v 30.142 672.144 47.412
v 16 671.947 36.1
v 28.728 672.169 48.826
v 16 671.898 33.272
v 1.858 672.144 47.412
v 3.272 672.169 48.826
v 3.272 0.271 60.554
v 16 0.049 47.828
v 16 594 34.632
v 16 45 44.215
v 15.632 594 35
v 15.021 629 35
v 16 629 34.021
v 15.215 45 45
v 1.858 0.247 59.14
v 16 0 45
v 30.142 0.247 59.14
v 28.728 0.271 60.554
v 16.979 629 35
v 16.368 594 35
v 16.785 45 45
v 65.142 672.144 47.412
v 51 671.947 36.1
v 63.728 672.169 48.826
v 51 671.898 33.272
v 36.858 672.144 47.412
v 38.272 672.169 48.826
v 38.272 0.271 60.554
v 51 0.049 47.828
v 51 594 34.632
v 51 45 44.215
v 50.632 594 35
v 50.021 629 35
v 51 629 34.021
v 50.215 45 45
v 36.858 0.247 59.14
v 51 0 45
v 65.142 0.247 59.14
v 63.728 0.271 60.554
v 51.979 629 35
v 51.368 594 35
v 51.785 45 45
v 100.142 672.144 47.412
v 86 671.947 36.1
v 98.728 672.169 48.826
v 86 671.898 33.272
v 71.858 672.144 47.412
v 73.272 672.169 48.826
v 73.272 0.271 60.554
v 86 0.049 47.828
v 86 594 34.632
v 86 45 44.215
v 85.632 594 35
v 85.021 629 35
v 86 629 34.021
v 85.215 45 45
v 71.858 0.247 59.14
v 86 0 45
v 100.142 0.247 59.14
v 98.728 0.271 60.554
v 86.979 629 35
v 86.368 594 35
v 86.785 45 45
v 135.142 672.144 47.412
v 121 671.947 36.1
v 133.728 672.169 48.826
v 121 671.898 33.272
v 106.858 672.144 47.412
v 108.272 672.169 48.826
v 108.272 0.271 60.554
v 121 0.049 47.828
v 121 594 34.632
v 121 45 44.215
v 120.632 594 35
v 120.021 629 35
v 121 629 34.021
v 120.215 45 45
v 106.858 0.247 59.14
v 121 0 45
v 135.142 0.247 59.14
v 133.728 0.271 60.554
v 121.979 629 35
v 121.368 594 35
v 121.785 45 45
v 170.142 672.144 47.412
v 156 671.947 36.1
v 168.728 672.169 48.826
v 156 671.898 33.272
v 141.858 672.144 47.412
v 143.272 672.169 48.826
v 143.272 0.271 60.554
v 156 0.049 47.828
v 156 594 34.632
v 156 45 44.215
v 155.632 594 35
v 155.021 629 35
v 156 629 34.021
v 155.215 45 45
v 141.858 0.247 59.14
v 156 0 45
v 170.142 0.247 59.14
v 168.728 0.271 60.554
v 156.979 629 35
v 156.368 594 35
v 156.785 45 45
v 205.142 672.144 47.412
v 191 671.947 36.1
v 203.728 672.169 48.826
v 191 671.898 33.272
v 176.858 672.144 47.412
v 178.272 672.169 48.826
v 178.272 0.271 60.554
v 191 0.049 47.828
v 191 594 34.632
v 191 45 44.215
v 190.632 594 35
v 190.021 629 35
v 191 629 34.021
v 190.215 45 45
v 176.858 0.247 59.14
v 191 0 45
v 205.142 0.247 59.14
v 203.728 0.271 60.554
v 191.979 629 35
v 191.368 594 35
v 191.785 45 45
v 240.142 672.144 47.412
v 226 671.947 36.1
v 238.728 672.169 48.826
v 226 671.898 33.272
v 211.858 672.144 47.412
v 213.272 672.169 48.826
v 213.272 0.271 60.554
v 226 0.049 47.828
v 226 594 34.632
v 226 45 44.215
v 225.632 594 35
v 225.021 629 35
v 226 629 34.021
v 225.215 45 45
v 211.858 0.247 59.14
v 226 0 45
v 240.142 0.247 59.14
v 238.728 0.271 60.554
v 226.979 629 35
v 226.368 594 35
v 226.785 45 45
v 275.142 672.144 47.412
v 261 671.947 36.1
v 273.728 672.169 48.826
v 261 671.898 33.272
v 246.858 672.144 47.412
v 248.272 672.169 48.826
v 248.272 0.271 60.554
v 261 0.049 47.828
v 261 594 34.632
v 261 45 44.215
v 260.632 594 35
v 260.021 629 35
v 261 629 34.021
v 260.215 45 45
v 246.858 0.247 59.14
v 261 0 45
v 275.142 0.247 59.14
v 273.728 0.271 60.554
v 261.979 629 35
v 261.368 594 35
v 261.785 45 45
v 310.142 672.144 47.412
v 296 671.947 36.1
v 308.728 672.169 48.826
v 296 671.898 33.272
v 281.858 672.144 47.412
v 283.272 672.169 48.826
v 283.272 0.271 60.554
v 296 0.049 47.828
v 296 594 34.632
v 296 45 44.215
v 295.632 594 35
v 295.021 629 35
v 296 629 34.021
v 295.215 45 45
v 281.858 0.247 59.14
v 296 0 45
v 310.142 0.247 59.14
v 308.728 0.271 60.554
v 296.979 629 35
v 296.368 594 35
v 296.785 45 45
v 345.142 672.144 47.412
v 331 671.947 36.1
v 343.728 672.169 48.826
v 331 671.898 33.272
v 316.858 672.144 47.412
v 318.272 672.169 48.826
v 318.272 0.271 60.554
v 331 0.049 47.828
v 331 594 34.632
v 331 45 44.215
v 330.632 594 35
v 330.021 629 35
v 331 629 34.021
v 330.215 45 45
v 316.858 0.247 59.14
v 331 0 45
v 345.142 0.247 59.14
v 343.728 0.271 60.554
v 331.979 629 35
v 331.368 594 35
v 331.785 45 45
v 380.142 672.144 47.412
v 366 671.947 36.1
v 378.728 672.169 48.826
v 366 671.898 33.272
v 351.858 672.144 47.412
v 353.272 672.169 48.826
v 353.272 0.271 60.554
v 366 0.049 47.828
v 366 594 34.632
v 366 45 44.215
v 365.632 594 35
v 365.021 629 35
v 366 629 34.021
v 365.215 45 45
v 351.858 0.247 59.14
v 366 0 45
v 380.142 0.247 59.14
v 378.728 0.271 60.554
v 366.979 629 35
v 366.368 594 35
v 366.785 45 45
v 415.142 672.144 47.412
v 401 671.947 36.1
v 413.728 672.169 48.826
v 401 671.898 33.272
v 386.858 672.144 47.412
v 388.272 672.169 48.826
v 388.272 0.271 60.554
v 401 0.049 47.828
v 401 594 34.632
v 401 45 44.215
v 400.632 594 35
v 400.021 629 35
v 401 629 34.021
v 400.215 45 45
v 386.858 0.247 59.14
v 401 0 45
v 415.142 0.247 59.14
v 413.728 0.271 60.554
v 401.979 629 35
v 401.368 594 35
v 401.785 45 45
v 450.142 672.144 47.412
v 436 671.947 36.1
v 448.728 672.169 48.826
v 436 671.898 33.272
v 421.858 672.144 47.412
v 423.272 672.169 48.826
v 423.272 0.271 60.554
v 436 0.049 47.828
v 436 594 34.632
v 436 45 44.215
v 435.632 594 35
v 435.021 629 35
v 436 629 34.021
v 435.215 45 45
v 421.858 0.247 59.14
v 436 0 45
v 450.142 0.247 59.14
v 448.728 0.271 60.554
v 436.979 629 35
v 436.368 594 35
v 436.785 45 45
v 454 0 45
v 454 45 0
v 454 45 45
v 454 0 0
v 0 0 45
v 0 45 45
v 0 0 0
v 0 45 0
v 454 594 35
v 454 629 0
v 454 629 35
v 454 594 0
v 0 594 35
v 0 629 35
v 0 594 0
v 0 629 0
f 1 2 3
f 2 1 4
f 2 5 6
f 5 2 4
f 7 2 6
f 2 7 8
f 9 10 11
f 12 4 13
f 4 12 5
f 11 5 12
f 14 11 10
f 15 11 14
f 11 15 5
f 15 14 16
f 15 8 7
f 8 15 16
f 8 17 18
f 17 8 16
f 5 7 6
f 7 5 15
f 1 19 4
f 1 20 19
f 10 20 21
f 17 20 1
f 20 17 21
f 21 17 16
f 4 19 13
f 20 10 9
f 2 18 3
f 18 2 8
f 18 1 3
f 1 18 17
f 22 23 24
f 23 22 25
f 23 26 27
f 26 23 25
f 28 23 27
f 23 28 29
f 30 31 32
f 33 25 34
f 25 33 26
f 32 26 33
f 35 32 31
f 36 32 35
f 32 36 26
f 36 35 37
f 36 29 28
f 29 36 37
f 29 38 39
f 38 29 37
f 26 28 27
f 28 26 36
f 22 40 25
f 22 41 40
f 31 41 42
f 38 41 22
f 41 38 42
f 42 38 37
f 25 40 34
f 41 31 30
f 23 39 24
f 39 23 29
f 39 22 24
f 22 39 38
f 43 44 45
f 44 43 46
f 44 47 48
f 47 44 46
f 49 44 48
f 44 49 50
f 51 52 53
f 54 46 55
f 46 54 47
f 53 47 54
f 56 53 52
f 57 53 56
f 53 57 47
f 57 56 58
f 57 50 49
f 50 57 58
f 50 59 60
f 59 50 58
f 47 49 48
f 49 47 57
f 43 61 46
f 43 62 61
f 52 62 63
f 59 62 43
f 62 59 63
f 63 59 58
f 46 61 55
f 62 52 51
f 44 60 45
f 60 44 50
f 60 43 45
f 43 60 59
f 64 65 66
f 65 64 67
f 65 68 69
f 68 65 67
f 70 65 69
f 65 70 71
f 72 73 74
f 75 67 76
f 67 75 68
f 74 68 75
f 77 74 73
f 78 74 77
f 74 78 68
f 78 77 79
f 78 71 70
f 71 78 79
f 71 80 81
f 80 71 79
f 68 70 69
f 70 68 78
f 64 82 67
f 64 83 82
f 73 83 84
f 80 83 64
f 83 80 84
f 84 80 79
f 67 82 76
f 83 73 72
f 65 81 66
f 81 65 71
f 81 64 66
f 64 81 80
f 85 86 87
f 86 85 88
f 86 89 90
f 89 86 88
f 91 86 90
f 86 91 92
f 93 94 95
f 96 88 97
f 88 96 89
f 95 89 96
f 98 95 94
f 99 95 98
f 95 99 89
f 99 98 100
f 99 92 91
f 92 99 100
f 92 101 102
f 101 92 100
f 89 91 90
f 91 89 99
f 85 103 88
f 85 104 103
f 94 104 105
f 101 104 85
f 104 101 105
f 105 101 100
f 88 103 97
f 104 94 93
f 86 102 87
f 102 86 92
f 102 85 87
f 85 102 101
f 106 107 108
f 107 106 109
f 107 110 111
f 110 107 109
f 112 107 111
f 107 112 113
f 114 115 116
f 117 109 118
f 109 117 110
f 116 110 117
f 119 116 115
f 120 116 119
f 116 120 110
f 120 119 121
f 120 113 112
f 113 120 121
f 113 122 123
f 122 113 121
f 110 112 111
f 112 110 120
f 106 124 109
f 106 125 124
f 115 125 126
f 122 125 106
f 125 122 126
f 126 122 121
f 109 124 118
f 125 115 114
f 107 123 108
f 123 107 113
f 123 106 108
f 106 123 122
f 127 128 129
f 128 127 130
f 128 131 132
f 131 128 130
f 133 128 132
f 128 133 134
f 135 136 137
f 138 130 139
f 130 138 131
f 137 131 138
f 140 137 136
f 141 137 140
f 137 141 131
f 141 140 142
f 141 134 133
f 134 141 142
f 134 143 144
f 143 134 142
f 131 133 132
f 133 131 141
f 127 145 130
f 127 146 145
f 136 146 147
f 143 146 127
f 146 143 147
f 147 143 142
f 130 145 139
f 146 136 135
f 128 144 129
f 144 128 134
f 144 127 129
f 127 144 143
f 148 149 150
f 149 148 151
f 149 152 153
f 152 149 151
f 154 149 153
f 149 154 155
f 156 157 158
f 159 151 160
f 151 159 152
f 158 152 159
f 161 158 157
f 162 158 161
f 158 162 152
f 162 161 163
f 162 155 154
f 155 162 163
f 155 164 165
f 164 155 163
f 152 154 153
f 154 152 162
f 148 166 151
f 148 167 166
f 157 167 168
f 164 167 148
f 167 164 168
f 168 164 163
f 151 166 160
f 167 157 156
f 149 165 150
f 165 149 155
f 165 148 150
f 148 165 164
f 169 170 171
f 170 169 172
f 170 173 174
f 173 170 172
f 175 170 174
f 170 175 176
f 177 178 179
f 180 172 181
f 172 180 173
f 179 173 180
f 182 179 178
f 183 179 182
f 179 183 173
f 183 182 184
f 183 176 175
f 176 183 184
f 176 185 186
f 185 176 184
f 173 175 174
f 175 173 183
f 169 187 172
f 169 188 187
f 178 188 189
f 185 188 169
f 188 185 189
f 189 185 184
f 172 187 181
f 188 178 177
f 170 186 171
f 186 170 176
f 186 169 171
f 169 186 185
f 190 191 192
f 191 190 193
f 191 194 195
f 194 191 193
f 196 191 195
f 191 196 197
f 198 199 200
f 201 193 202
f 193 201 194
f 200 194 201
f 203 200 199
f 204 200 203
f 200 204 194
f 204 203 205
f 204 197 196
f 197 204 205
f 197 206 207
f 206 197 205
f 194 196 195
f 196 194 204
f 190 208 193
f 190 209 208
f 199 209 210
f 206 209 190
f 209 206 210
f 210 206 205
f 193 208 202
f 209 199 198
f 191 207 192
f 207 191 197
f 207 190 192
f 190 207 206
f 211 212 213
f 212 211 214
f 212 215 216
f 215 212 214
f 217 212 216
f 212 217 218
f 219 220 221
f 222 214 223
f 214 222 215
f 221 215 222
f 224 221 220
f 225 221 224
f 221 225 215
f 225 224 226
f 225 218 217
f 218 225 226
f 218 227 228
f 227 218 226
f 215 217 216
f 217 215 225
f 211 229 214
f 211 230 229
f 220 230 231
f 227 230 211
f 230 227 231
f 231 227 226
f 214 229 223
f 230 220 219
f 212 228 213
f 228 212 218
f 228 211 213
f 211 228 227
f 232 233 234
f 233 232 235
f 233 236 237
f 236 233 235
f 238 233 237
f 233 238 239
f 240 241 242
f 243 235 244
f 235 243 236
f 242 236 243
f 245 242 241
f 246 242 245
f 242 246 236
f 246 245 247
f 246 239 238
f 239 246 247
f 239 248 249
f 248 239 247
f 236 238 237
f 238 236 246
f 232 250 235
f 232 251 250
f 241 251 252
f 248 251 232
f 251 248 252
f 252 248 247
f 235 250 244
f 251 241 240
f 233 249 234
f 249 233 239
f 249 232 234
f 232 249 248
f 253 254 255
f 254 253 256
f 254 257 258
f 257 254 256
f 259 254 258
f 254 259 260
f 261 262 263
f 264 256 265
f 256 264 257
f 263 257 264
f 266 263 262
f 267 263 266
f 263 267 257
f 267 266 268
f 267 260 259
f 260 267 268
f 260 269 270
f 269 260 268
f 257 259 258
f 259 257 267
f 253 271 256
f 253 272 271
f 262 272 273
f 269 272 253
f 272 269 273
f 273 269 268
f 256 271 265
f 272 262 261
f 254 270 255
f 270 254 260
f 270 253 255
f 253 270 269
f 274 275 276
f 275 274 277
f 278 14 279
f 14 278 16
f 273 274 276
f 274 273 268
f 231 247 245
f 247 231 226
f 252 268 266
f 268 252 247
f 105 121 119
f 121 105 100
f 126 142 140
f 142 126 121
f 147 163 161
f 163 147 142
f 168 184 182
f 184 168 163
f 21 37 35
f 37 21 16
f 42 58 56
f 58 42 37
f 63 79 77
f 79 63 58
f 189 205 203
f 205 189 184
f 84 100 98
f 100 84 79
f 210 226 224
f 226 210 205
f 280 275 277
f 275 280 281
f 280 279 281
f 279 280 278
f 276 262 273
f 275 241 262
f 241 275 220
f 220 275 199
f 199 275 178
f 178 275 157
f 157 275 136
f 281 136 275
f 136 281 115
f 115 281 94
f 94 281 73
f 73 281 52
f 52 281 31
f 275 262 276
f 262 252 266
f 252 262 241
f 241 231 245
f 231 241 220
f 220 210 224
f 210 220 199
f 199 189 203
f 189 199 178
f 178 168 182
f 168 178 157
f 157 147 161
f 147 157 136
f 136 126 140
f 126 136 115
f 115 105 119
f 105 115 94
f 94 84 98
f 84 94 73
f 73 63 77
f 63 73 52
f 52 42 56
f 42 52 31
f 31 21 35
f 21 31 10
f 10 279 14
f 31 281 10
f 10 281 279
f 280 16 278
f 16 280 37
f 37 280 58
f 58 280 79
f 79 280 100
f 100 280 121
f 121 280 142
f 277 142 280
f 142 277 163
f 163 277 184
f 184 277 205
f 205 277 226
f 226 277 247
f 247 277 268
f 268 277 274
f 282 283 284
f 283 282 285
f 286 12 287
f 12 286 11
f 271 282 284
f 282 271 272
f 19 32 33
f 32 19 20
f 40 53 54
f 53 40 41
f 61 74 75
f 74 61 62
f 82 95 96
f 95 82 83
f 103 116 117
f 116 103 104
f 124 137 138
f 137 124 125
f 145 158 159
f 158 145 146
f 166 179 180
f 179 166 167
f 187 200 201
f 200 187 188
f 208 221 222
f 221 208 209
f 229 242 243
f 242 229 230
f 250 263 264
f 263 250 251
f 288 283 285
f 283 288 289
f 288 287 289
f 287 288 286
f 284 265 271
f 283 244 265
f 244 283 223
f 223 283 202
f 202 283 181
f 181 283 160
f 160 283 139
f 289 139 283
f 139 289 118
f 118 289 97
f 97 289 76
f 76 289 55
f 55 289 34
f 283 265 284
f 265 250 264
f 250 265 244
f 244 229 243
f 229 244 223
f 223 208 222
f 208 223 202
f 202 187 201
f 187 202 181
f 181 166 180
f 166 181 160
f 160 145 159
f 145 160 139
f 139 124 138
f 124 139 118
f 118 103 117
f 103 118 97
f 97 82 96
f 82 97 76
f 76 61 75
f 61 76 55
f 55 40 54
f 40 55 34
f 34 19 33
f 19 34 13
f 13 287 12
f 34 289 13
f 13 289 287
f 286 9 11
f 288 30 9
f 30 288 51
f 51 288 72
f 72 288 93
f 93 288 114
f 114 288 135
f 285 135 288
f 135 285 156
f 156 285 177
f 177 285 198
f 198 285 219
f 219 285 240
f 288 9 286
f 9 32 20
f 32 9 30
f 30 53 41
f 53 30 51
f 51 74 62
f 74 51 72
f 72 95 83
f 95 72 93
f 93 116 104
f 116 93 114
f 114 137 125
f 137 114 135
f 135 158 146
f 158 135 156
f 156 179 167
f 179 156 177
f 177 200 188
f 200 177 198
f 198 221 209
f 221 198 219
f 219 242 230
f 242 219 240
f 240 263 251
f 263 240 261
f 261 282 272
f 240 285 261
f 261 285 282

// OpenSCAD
// file: ../../library/profiles.scad
module lShapeProfile($length, $size, $thickness) {
    cube([$length, $size, $thickness]);
    rotate([90, 0, 0])
    translate([0, 0, -$thickness]) cube([$length, $size, $thickness]);
}


module uShapeProfile($length, $size, $thickness) {
    cube([$length, $size, $thickness]);
    rotate([90, 0, 0])
    translate([0, 0, -$thickness]) cube([$length, $size, $thickness]);

    translate([0, $size, 0])
    rotate([90, 0, 0])
    cube([$length, $size, $thickness]);
}


module squareTubeProfile($length, $size, $thickness) {
    cube([$length, $size, $thickness]);

    rotate([90, 0, 0])
    translate([0, 0, -$thickness])
    cube([$length, $size, $thickness]);

    translate([0, $size, 0])
    rotate([90, 0, 0])
    cube([$length, $size, $thickness]);

    translate([0, 0, $size - $thickness])
    cube([$length, $size, $thickness]);
}
// file: grate.scad
include <../../library/profiles.scad>
include <./config.scad>


grateLength = floor(outerWidth - fireBasketWidth - (profileSize * 4) - (grateGap * 4) - ((4 * grateProfileThickness)));
grateWidth = outerDepth - profileSize - (6 * grateProfileThickness);
halfGrateLength = floor((grateLength - grateProfileThickness) / 2);


module grateTemplate(grateLength = 400, grateWidth = 400, frontProjection = false) {
    // hinten
    if (frontProjection) {
        cube([grateLength, profileSize, profileSize]);
    } else {
        cube([grateLength, profileSize + 5, profileSize + 5]);
    }
    // vorne
    translate([0, grateWidth - profileSize - 8, 0])
    cube([grateLength, profileSize - 5 , profileSize - 5]);
    
    if (frontProjection) {
        // rippen
        amount = round(grateLength / 35);
        startPos = 16;
        echo(str("anzahl ", amount))
        for ( i = [0 : amount - 1] ) {
            translate([(i * 35) + startPos, 0, profileSize])
            rotate([45, 0, 90])
            lShapeProfile(grateWidth + 30, 20, 2);
        }
    } else {
        // rippen
        amount = round(grateLength / 35);
        startPos = 16;
        echo(str("anzahl ", amount))
        for ( i = [0 : amount - 1] ) {
            translate([(i * 35) + startPos, 0, profileSize + 5])
            rotate([45, 1, 90])
            lShapeProfile(grateWidth + 30, 20, 2);
        }
    }
}

module grate() {
    grateTemplate(grateLength, grateWidth);
}

module halfGrate(frontProjection = false) {
    grateTemplate(halfGrateLength, grateWidth, frontProjection);
}

module halfGratePartsList() {
    amount = round(halfGrateLength / 35);
    echo(str("Nr,Beschreibung,Stück,Länge,Breite,Höhe"));

    // Träger
    echo(str("1,Vierkant Vorne", ",", "1", ",", halfGrateLength, ",", profileSize, ",", profileSize));
    echo(str("2,Vierkant Vorne", ",", "1", ",", halfGrateLength, ",", profileSize + 5, ",", profileSize + 5));
    // Rost
    echo(str("3,Winkel für Rost", ",", amount, ",", grateWidth + 30, ",20,20"));

}


module drawHalfGrateFrontProjection() {

    // Vorne
    translate([outerWidth, - outerHeight, 0])
    projection() {
        rotate([90,0,180])
        halfGrate(frontProjection = true);
    }
}

module drawFrameSideProjection() {
    translate([outerDepth, - outerHeight, 0])
    // // Seite
    rotate([0,0,90])
    projection() {
        translate([0, 0, 0])
        rotate([0,90,0])
        frame();
    }
}

module drawFrameTopProjection() {
    // // Draufsicht
    translate([outerWidth, 0, 0])
    projection() {
        rotate([0,0,180])
        frame();
    }
}
// file: config.scad
drawReferences = false;
drawReferenceWall = false;

outerWidth = 1500;
outerDepth = 700;
outerHeight = 700;

profileSize = 40;

fireBasketHeight = 250;
fireBasketWidth = 400;
fireBasketGroundClearance = 100;
fireBasketFrontOpen = true;

spindleDiameter  = 20;
spindleOverlength = 5;
spindleWallExtension = 140;
spindleWheelDiameter = 200;
spindlePlateThickness = 5;
spindlePlateGap = 2;
spindleHandleThickness = 8;

grateGap = 4;
grateSize = 30;
grateProfileThickness = 3;

lineThickness = 1;
lineGap = 80;
textSize = 20;

$fn = 120;
// main file
include <./config.scad>
include <./grate.scad>


color([255/255, 127/255, 127/255])
halfGrate();


// start csv header
halfGratePartsList();
